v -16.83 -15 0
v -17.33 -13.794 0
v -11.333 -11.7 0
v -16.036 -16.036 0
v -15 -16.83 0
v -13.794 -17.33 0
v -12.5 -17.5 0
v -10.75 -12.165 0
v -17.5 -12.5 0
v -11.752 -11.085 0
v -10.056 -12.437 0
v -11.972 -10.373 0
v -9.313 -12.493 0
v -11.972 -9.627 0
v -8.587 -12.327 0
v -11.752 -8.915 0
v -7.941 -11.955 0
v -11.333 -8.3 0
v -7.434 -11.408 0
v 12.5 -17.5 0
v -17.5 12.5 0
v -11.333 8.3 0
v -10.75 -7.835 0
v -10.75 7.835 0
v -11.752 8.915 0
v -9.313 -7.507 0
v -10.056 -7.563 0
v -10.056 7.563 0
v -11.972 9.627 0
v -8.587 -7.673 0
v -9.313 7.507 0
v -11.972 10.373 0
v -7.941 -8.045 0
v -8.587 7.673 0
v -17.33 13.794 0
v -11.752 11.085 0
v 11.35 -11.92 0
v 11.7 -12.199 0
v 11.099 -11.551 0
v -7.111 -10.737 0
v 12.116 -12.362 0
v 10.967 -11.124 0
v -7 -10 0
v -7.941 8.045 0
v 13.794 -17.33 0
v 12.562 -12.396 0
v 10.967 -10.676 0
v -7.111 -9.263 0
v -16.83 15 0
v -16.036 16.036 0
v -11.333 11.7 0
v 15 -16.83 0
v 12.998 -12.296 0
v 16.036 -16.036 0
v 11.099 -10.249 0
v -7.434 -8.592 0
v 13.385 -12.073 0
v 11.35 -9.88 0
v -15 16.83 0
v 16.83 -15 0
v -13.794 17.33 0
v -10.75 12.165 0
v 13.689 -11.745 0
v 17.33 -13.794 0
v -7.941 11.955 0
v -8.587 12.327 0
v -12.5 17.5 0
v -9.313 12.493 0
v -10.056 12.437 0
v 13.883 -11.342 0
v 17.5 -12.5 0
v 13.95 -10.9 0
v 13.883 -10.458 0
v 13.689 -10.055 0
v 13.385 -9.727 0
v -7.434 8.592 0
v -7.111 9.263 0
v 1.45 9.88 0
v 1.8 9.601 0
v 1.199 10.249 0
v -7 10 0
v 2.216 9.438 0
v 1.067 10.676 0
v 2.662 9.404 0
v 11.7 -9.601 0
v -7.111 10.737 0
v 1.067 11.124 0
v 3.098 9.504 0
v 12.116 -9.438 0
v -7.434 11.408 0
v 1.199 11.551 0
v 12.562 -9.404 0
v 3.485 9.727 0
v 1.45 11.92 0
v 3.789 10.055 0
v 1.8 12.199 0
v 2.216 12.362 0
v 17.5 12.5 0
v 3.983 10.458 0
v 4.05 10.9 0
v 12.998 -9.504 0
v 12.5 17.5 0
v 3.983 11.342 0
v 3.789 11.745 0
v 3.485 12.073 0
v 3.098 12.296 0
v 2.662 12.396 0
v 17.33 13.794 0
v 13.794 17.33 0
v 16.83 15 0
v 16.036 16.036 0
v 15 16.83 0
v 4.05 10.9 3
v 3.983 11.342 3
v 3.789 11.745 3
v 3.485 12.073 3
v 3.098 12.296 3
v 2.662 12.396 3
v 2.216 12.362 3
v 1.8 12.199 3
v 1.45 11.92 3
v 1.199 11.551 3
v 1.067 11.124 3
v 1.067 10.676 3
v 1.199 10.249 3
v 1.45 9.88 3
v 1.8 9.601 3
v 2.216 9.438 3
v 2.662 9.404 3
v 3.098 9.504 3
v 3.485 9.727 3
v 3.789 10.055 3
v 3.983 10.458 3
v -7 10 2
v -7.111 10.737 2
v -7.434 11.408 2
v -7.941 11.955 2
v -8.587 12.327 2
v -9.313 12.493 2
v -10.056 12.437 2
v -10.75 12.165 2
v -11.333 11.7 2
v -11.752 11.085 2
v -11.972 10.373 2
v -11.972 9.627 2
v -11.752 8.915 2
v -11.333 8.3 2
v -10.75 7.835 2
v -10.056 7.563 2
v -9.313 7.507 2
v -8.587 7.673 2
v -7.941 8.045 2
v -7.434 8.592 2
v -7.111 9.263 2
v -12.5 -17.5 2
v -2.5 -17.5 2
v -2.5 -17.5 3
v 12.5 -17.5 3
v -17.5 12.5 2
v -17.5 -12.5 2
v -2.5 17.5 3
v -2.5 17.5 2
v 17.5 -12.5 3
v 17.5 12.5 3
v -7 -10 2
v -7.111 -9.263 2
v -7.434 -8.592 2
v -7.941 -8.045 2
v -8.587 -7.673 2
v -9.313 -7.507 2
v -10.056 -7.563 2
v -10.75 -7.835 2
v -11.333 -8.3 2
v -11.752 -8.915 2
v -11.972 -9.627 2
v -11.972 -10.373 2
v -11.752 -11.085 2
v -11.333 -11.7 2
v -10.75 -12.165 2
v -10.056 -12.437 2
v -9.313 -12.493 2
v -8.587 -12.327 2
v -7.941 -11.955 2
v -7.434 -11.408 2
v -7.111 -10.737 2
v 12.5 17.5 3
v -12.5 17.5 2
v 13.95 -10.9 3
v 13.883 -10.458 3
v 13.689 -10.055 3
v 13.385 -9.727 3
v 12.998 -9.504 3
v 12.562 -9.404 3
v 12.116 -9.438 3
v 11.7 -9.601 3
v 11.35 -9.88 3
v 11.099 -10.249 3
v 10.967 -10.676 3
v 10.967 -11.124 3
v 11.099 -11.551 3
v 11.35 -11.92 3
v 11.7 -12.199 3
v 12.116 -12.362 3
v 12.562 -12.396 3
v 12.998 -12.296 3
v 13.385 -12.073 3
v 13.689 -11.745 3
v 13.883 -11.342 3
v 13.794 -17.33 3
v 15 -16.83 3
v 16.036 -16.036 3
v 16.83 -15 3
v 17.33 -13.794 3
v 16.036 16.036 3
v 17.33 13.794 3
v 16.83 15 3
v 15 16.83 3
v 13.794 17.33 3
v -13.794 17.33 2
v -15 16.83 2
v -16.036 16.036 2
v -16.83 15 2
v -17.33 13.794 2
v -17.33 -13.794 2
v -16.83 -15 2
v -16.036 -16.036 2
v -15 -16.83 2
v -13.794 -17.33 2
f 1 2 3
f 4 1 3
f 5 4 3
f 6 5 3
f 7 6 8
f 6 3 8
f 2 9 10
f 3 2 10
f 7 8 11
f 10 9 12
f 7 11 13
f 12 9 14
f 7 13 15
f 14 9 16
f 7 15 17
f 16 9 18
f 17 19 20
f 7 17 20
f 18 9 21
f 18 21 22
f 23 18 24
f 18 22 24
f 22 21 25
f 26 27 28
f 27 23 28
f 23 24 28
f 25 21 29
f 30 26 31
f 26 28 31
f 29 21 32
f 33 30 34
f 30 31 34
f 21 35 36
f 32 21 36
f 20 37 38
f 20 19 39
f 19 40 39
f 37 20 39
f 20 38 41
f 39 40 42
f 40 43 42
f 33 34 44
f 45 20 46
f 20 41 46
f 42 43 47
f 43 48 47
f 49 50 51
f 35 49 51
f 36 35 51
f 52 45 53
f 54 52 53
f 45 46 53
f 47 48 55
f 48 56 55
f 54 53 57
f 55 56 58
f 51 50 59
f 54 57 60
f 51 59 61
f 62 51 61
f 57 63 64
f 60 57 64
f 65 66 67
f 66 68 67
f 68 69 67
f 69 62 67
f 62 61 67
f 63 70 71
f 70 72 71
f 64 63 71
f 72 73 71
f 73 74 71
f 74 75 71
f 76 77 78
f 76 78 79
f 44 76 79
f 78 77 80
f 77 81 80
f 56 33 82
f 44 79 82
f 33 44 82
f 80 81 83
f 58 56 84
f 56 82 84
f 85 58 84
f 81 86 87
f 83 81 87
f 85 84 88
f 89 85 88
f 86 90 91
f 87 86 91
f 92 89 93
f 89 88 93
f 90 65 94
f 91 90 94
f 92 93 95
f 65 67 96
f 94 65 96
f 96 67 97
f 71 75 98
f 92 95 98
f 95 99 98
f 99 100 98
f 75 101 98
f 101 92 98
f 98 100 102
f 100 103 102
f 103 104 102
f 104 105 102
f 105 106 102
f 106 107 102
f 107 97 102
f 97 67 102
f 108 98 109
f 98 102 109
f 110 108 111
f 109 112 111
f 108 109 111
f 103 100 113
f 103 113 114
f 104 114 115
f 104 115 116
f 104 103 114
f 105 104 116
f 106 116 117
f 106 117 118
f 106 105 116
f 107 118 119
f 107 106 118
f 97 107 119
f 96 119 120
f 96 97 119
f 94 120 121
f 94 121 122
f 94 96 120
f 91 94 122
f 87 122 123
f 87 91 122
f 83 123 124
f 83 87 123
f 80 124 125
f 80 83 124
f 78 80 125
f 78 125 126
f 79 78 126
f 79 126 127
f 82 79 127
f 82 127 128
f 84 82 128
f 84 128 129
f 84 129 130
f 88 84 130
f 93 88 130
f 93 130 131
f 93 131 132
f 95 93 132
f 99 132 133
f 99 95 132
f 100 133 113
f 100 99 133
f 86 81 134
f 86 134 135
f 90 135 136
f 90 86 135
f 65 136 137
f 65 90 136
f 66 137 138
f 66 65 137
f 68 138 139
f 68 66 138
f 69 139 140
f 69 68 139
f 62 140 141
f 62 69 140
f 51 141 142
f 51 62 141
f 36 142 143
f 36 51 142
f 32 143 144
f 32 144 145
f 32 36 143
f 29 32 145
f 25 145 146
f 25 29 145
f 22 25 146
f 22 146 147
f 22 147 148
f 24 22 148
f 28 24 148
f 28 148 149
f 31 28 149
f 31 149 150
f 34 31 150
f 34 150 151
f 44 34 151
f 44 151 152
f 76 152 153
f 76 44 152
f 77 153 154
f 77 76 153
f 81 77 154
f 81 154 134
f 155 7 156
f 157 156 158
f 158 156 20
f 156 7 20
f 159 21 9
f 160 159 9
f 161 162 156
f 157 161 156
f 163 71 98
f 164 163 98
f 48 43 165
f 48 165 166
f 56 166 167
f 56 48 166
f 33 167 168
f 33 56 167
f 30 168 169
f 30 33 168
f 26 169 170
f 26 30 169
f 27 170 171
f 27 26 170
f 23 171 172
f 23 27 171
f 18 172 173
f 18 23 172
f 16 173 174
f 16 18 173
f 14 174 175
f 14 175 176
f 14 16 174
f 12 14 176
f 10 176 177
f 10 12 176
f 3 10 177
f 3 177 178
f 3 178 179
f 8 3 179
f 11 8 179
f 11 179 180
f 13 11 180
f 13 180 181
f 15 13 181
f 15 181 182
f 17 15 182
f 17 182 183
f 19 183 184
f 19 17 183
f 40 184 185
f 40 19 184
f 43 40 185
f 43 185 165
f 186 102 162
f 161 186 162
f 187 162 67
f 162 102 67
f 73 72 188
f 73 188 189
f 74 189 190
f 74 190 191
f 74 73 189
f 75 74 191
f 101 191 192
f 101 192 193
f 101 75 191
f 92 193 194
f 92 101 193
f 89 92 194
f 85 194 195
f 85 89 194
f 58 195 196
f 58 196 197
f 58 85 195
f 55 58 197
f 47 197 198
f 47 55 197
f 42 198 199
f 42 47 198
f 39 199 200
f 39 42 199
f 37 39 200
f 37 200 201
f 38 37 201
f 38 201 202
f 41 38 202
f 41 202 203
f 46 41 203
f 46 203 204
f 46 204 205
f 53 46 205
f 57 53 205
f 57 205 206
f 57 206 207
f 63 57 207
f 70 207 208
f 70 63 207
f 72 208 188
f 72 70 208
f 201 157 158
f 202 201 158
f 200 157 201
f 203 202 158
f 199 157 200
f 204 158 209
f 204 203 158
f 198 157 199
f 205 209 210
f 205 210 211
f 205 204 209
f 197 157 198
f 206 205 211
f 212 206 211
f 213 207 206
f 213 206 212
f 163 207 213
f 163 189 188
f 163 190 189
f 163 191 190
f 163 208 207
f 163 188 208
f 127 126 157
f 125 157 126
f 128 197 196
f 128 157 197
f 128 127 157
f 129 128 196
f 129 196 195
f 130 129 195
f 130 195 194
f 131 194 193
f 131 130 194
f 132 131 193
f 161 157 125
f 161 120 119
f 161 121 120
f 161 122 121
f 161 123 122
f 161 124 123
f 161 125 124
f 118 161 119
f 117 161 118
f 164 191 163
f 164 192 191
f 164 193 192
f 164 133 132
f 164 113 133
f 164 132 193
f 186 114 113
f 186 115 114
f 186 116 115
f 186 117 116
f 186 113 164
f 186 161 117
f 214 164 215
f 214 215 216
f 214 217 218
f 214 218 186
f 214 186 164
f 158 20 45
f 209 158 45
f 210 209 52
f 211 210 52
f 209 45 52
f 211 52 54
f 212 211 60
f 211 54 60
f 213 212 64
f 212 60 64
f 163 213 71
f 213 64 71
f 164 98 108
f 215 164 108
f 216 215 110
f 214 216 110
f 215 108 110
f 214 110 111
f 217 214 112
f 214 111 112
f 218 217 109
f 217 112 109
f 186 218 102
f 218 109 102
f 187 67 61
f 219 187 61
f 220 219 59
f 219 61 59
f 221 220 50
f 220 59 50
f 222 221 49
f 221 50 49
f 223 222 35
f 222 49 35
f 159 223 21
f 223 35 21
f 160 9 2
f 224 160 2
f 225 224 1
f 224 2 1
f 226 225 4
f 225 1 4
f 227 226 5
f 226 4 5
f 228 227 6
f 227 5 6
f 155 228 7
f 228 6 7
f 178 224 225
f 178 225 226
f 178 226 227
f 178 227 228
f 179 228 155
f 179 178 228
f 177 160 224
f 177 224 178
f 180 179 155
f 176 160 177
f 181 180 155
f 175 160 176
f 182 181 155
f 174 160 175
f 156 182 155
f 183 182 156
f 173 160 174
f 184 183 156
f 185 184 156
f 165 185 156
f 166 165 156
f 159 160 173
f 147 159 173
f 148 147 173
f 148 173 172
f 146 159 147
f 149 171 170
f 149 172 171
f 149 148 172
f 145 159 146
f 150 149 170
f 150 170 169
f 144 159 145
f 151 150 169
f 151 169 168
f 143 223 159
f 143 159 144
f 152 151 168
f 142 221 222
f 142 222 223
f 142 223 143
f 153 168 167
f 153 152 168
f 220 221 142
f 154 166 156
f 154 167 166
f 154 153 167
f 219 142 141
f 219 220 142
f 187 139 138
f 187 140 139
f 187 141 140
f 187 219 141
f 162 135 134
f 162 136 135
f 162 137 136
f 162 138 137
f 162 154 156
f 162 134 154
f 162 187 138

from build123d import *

# Parameters (mm, degrees)
F0_R     = 1.5
F1_DEPTH = 3
F0_R_2   = 2.5
F2_DEPTH = 2


# Not quite as in the source:
# - a feature of the source that left no trace in its solid (it failed there, or was rolled back) is left out


with BuildPart() as f1:
    # F0 (on Top) → F1 (new body)
    with BuildSketch(Plane.XY):
        with BuildLine():
            Line((-2.5, -17.5), (12.5, -17.5))
            ThreePointArc((12.5, -17.5), (16.0355339059, -16.0355339059), (17.5, -12.5))
            Line((17.5, -12.5), (17.5, 12.5))
            ThreePointArc((17.5, 12.5), (16.0355339059, 16.0355339059), (12.5, 17.5))
            Line((12.5, 17.5), (-2.5, 17.5))
            Line((-2.5, 17.5), (-2.5, -17.5))
        make_face()
        with Locations((12.45, -10.9)):
            Circle(F0_R, mode=Mode.SUBTRACT)
        with Locations((2.55, 10.9)):
            Circle(F0_R, mode=Mode.SUBTRACT)
    extrude(amount=F1_DEPTH)

    # F0 (on Top) → F2 (join)
    with BuildSketch(Plane.XY):
        with BuildLine():
            Line((-12.5, -17.5), (-2.5, -17.5))
            Line((-2.5, -17.5), (-2.5, 17.5))
            Line((-2.5, 17.5), (-12.5, 17.5))
            ThreePointArc((-12.5, 17.5), (-16.0355339059, 16.0355339059), (-17.5, 12.5))
            Line((-17.5, 12.5), (-17.5, -12.5))
            ThreePointArc((-17.5, -12.5), (-16.0355339059, -16.0355339059), (-12.5, -17.5))
        make_face()
        with Locations((-9.5, -10)):
            Circle(F0_R_2, mode=Mode.SUBTRACT)
        with Locations((-9.5, 10)):
            Circle(F0_R_2, mode=Mode.SUBTRACT)
    extrude(amount=F2_DEPTH)


solid = f1.part
